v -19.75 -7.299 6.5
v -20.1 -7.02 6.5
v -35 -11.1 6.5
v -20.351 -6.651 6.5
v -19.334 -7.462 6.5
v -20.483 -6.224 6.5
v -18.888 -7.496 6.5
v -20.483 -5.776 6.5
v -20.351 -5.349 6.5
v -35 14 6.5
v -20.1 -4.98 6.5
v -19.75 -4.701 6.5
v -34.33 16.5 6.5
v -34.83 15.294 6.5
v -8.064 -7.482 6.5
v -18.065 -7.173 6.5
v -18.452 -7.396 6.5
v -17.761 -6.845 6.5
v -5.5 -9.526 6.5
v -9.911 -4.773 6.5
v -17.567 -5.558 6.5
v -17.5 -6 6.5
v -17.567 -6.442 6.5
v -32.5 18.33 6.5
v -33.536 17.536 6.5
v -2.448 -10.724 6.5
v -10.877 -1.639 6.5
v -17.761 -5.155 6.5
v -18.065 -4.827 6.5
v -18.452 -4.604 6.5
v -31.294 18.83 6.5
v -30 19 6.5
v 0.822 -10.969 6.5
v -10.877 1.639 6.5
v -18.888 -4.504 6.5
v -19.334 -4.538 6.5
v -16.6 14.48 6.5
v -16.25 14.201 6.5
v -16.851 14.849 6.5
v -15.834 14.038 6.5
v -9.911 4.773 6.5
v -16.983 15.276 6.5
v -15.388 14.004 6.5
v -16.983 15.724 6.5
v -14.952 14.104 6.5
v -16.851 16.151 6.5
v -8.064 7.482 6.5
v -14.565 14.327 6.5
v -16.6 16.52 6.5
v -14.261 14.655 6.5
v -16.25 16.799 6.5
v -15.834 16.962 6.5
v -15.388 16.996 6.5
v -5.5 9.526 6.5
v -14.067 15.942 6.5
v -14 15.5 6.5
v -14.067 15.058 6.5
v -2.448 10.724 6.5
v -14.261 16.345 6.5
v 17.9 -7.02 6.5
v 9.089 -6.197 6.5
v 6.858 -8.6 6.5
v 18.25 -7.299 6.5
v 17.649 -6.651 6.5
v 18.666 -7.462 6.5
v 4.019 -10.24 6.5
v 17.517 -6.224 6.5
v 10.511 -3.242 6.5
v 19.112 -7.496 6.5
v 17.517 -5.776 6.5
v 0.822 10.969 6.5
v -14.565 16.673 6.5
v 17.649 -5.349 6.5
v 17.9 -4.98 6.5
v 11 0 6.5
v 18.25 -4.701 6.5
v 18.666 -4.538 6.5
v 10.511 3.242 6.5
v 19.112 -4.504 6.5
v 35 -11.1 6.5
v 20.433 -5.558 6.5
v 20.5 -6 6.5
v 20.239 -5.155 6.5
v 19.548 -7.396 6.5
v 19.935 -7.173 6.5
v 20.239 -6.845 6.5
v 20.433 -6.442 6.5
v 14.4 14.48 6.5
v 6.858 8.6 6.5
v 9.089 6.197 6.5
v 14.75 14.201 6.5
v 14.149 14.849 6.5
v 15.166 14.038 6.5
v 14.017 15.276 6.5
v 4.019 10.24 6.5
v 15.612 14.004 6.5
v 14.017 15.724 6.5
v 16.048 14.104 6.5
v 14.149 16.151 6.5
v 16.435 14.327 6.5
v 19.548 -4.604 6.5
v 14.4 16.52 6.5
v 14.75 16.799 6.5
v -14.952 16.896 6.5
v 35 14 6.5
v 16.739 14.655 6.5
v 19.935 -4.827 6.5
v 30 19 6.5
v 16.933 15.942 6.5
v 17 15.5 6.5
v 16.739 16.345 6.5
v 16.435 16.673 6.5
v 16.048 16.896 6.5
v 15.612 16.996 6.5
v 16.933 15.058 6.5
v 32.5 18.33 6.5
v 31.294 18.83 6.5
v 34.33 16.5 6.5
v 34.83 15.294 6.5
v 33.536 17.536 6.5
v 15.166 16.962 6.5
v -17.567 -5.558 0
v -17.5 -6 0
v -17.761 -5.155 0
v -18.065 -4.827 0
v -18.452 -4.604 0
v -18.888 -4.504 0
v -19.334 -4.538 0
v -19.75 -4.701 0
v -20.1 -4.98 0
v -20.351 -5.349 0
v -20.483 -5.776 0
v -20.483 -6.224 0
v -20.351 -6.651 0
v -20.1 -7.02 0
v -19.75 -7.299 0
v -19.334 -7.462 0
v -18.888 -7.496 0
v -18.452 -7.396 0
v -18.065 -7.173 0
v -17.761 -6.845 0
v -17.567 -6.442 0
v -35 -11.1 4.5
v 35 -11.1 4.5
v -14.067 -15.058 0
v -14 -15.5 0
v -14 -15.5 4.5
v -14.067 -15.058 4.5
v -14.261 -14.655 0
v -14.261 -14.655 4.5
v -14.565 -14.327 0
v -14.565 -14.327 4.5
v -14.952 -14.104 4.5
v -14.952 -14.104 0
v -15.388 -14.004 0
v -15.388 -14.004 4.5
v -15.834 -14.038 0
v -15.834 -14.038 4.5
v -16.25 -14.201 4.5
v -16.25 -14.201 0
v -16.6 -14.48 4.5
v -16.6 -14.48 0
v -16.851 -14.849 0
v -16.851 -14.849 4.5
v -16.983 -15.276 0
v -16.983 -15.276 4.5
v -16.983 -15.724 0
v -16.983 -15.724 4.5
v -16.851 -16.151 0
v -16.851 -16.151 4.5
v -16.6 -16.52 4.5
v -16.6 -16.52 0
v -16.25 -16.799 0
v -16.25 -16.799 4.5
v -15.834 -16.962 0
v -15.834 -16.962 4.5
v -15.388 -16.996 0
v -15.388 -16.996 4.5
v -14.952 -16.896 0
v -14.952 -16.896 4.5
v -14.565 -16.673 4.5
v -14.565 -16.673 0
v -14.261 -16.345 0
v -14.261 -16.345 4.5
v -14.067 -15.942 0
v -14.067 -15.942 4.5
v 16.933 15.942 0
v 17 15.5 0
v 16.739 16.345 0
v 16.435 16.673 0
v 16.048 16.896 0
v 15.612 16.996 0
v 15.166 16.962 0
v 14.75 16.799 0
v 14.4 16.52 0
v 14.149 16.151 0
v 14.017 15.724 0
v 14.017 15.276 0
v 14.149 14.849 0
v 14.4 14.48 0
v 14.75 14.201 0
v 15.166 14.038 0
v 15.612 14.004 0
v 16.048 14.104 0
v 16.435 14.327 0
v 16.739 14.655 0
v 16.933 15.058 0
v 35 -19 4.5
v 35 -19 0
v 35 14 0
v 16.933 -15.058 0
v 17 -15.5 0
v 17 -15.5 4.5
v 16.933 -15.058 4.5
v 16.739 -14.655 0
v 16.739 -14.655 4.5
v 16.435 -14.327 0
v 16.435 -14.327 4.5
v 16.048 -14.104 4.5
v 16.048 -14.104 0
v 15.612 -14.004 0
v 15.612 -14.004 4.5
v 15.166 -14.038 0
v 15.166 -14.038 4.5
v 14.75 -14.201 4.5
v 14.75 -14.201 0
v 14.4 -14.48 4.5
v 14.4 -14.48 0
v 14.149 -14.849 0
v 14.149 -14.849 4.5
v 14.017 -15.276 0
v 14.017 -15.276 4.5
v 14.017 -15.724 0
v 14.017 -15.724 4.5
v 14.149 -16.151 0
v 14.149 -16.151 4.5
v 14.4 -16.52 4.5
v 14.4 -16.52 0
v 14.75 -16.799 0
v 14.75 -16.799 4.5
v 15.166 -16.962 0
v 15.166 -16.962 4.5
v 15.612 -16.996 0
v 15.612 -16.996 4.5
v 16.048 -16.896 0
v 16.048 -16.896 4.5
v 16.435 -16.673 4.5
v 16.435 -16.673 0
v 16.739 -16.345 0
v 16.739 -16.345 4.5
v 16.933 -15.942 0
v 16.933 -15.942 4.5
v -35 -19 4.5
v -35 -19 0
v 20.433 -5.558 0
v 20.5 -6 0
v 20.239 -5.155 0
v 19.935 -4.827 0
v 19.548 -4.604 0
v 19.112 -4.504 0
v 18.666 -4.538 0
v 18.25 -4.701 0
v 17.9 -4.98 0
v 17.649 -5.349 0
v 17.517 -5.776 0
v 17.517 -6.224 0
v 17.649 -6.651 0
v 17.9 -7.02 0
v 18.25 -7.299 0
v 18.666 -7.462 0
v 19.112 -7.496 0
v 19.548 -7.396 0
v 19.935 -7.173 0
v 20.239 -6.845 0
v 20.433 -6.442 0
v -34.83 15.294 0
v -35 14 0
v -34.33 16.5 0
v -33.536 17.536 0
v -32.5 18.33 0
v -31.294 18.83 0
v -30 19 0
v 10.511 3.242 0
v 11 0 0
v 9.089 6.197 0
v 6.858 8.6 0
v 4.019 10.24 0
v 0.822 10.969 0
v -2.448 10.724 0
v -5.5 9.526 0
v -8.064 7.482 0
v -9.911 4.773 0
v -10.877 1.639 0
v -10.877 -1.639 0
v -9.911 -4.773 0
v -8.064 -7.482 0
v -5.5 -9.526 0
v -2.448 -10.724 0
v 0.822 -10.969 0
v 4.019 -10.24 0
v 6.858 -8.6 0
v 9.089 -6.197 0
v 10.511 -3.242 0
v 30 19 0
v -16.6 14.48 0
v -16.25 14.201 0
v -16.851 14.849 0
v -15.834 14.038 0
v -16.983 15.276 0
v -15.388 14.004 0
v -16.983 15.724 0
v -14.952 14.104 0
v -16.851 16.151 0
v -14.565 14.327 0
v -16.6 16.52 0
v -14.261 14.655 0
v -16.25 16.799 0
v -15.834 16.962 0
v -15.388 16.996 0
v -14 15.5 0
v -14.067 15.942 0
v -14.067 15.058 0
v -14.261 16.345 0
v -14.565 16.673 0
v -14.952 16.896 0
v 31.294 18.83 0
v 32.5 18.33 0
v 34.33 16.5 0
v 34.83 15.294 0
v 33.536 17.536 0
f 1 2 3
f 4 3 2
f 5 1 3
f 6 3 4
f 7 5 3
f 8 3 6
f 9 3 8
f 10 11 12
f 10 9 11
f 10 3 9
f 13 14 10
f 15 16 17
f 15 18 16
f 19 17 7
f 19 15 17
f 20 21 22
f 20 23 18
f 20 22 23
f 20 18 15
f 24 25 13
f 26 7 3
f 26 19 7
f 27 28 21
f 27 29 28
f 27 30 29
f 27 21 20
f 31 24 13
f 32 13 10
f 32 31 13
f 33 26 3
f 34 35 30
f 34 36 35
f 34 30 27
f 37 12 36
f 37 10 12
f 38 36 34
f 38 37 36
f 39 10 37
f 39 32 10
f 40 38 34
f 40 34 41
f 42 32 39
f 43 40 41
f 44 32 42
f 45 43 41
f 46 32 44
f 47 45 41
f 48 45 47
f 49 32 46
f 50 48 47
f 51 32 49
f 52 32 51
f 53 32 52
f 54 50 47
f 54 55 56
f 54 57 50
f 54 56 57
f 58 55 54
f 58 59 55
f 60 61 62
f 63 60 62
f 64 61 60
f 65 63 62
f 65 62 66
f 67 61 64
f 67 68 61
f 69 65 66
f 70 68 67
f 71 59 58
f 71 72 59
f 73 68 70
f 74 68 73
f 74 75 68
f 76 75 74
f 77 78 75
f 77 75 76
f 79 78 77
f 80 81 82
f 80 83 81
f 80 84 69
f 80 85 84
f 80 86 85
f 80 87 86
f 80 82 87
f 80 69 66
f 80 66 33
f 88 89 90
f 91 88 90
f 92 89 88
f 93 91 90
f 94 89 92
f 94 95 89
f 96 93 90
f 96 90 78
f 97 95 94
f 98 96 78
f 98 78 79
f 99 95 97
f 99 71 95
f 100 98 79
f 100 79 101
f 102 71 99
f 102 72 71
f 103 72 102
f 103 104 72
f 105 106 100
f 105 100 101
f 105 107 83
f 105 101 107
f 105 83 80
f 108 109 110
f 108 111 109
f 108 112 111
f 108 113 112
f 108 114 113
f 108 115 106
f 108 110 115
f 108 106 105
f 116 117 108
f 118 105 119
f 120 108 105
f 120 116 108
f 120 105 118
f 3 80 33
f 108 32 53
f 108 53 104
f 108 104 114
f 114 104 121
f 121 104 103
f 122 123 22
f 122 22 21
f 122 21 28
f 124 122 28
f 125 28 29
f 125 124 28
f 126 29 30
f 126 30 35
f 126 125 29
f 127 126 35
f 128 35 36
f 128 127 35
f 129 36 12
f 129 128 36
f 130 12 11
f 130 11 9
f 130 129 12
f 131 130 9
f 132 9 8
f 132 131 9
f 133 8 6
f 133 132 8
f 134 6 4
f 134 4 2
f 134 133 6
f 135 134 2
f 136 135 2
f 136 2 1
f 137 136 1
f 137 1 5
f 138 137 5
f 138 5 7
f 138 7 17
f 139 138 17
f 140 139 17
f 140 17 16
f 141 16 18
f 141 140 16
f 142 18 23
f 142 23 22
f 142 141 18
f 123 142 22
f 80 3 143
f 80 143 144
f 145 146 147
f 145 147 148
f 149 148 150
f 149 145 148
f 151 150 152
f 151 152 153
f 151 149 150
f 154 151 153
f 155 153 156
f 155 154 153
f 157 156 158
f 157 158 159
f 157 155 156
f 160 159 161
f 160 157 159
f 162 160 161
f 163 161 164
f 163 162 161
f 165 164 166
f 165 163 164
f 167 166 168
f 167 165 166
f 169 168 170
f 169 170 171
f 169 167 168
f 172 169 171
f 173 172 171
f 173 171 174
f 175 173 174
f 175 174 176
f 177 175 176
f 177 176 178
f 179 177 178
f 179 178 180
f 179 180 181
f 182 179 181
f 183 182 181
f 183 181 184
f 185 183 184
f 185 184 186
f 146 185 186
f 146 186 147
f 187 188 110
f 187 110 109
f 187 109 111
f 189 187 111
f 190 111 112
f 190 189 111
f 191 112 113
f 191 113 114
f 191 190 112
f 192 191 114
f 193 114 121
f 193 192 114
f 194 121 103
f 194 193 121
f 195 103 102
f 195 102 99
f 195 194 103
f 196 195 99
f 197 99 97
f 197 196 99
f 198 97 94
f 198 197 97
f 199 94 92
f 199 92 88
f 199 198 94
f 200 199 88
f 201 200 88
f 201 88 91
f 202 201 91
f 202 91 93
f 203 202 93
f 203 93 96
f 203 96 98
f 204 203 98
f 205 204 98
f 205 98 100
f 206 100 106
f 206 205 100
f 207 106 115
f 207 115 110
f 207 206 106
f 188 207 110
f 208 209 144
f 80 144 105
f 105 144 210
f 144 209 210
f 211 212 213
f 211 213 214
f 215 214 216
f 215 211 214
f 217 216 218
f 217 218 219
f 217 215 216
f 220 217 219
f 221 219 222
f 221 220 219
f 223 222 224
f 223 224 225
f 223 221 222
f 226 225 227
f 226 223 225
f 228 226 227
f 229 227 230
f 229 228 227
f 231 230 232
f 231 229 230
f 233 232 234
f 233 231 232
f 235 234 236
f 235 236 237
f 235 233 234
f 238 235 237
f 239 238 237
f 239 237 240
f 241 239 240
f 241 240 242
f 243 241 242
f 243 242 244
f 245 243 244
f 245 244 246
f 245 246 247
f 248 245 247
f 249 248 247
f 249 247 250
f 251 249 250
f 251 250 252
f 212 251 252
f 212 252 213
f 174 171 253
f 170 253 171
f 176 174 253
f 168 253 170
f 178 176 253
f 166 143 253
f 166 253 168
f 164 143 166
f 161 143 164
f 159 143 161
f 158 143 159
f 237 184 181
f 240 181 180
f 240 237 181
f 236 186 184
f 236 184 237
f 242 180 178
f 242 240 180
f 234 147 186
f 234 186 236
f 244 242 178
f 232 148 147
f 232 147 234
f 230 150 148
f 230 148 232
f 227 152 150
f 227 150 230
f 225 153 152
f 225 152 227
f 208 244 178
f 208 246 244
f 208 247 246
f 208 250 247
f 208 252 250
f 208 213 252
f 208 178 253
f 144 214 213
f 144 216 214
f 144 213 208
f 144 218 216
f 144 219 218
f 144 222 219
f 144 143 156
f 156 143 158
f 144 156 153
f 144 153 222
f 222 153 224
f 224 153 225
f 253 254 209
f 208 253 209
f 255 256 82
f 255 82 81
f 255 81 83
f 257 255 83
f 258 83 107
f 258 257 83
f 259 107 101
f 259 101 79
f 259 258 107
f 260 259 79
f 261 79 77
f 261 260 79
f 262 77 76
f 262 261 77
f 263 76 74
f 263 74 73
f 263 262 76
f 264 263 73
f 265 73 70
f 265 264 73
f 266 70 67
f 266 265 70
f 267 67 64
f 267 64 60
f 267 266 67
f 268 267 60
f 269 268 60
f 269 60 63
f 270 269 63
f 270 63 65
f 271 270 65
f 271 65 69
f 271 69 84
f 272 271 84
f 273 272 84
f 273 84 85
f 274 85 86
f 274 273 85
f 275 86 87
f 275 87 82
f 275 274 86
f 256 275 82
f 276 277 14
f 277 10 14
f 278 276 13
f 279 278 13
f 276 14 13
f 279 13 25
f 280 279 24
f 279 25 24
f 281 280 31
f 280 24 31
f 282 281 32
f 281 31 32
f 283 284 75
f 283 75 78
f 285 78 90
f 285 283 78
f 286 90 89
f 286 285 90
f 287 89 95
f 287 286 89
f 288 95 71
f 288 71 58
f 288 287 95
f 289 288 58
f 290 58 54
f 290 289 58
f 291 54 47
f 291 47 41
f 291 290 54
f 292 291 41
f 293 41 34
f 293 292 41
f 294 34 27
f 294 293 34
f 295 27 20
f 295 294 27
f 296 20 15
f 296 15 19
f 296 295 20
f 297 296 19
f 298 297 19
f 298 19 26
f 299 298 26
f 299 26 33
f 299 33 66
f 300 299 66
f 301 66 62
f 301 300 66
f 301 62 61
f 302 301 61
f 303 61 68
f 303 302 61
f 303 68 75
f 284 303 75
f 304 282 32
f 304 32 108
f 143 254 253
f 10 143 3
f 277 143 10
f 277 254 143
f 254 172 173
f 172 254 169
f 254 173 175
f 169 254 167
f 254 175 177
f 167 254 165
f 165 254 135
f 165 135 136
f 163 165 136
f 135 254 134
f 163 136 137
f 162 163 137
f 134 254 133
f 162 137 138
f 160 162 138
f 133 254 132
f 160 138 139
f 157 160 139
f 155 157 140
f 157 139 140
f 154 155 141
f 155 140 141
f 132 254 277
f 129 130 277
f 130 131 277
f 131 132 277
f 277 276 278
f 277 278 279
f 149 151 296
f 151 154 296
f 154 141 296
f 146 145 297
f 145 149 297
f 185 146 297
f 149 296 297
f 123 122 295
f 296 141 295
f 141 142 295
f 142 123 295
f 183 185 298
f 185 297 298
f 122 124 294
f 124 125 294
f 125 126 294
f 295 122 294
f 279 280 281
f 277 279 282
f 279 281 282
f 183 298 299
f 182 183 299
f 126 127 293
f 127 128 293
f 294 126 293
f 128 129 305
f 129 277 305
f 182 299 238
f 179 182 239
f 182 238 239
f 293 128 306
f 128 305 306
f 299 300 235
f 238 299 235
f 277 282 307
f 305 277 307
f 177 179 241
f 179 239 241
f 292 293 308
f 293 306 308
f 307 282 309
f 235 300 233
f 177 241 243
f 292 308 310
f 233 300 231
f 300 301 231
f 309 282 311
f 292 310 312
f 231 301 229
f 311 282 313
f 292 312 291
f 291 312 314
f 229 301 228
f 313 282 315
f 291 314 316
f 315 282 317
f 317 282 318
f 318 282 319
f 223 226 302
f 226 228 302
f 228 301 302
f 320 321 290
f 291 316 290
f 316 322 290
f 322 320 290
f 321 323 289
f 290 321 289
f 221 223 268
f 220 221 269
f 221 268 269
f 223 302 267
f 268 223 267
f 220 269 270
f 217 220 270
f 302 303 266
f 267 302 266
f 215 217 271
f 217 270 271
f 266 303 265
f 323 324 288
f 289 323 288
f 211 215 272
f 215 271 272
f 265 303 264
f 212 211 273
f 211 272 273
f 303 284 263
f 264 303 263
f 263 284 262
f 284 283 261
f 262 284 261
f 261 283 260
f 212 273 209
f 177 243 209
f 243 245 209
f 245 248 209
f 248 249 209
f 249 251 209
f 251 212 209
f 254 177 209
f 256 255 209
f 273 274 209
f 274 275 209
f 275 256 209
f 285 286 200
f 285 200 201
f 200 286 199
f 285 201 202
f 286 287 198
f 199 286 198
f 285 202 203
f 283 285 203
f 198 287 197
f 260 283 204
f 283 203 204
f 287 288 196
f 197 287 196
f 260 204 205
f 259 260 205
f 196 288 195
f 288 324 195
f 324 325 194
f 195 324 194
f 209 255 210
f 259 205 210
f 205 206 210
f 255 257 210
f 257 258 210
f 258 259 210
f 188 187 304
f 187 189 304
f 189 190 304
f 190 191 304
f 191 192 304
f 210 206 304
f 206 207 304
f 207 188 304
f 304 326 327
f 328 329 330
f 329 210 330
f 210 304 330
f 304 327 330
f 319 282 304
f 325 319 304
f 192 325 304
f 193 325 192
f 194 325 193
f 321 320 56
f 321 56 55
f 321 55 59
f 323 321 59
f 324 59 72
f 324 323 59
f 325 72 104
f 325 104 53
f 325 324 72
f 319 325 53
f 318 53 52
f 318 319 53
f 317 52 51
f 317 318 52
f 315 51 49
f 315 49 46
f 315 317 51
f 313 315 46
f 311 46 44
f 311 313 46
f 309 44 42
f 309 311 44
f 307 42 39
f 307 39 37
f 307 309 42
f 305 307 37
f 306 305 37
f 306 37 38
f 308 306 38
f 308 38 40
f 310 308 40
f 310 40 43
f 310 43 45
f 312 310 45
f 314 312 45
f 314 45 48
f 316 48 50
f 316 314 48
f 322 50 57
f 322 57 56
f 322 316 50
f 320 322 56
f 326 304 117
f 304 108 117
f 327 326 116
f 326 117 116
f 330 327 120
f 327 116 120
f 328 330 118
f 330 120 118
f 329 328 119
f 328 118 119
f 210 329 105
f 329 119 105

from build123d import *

# Parameters (mm, degrees)
F0_W     = 70
F0_H     = 38
F0_R     = 1.5
F0_R_2   = 11
F1_DEPTH = 6.5
F2_W     = 70
F2_H     = 7.9
F2_R     = 1.5
F3_DEPTH = 2
F4_R     = 5


with BuildPart() as f1:
    # F0 (on Top) → F1 (new body)
    with BuildSketch(Plane.XY):
        Rectangle(F0_W, F0_H)
        with Locations((-15.5, -15.5)):
            Circle(F0_R, mode=Mode.SUBTRACT)
        with Locations((-19, -6)):
            Circle(F0_R, mode=Mode.SUBTRACT)
        with Locations((15.5, -15.5)):
            Circle(F0_R, mode=Mode.SUBTRACT)
        with Locations((19, -6)):
            Circle(F0_R, mode=Mode.SUBTRACT)
        with Locations((-15.5, 15.5)):
            Circle(F0_R, mode=Mode.SUBTRACT)
        Circle(F0_R_2, mode=Mode.SUBTRACT)
        with Locations((15.5, 15.5)):
            Circle(F0_R, mode=Mode.SUBTRACT)
    extrude(amount=F1_DEPTH)

    # F2 (on face) → F3 (cut)
    with BuildSketch(Plane.XY.offset(6.5)):
        with Locations((0, -15.05)):
            Rectangle(F2_W, F2_H)
        with Locations((-15.5, -15.5)):
            Circle(F2_R, mode=Mode.SUBTRACT)
        with Locations((15.5, -15.5)):
            Circle(F2_R, mode=Mode.SUBTRACT)
    extrude(amount=-F3_DEPTH, mode=Mode.SUBTRACT)

    # F4
    f4_edges = [f1.edges().sort_by_distance(p)[0] for p in [
        (35, 19, 3.25),
        (-35, 19, 3.25),
    ]]
    fillet(f4_edges, radius=F4_R)


solid = f1.part
